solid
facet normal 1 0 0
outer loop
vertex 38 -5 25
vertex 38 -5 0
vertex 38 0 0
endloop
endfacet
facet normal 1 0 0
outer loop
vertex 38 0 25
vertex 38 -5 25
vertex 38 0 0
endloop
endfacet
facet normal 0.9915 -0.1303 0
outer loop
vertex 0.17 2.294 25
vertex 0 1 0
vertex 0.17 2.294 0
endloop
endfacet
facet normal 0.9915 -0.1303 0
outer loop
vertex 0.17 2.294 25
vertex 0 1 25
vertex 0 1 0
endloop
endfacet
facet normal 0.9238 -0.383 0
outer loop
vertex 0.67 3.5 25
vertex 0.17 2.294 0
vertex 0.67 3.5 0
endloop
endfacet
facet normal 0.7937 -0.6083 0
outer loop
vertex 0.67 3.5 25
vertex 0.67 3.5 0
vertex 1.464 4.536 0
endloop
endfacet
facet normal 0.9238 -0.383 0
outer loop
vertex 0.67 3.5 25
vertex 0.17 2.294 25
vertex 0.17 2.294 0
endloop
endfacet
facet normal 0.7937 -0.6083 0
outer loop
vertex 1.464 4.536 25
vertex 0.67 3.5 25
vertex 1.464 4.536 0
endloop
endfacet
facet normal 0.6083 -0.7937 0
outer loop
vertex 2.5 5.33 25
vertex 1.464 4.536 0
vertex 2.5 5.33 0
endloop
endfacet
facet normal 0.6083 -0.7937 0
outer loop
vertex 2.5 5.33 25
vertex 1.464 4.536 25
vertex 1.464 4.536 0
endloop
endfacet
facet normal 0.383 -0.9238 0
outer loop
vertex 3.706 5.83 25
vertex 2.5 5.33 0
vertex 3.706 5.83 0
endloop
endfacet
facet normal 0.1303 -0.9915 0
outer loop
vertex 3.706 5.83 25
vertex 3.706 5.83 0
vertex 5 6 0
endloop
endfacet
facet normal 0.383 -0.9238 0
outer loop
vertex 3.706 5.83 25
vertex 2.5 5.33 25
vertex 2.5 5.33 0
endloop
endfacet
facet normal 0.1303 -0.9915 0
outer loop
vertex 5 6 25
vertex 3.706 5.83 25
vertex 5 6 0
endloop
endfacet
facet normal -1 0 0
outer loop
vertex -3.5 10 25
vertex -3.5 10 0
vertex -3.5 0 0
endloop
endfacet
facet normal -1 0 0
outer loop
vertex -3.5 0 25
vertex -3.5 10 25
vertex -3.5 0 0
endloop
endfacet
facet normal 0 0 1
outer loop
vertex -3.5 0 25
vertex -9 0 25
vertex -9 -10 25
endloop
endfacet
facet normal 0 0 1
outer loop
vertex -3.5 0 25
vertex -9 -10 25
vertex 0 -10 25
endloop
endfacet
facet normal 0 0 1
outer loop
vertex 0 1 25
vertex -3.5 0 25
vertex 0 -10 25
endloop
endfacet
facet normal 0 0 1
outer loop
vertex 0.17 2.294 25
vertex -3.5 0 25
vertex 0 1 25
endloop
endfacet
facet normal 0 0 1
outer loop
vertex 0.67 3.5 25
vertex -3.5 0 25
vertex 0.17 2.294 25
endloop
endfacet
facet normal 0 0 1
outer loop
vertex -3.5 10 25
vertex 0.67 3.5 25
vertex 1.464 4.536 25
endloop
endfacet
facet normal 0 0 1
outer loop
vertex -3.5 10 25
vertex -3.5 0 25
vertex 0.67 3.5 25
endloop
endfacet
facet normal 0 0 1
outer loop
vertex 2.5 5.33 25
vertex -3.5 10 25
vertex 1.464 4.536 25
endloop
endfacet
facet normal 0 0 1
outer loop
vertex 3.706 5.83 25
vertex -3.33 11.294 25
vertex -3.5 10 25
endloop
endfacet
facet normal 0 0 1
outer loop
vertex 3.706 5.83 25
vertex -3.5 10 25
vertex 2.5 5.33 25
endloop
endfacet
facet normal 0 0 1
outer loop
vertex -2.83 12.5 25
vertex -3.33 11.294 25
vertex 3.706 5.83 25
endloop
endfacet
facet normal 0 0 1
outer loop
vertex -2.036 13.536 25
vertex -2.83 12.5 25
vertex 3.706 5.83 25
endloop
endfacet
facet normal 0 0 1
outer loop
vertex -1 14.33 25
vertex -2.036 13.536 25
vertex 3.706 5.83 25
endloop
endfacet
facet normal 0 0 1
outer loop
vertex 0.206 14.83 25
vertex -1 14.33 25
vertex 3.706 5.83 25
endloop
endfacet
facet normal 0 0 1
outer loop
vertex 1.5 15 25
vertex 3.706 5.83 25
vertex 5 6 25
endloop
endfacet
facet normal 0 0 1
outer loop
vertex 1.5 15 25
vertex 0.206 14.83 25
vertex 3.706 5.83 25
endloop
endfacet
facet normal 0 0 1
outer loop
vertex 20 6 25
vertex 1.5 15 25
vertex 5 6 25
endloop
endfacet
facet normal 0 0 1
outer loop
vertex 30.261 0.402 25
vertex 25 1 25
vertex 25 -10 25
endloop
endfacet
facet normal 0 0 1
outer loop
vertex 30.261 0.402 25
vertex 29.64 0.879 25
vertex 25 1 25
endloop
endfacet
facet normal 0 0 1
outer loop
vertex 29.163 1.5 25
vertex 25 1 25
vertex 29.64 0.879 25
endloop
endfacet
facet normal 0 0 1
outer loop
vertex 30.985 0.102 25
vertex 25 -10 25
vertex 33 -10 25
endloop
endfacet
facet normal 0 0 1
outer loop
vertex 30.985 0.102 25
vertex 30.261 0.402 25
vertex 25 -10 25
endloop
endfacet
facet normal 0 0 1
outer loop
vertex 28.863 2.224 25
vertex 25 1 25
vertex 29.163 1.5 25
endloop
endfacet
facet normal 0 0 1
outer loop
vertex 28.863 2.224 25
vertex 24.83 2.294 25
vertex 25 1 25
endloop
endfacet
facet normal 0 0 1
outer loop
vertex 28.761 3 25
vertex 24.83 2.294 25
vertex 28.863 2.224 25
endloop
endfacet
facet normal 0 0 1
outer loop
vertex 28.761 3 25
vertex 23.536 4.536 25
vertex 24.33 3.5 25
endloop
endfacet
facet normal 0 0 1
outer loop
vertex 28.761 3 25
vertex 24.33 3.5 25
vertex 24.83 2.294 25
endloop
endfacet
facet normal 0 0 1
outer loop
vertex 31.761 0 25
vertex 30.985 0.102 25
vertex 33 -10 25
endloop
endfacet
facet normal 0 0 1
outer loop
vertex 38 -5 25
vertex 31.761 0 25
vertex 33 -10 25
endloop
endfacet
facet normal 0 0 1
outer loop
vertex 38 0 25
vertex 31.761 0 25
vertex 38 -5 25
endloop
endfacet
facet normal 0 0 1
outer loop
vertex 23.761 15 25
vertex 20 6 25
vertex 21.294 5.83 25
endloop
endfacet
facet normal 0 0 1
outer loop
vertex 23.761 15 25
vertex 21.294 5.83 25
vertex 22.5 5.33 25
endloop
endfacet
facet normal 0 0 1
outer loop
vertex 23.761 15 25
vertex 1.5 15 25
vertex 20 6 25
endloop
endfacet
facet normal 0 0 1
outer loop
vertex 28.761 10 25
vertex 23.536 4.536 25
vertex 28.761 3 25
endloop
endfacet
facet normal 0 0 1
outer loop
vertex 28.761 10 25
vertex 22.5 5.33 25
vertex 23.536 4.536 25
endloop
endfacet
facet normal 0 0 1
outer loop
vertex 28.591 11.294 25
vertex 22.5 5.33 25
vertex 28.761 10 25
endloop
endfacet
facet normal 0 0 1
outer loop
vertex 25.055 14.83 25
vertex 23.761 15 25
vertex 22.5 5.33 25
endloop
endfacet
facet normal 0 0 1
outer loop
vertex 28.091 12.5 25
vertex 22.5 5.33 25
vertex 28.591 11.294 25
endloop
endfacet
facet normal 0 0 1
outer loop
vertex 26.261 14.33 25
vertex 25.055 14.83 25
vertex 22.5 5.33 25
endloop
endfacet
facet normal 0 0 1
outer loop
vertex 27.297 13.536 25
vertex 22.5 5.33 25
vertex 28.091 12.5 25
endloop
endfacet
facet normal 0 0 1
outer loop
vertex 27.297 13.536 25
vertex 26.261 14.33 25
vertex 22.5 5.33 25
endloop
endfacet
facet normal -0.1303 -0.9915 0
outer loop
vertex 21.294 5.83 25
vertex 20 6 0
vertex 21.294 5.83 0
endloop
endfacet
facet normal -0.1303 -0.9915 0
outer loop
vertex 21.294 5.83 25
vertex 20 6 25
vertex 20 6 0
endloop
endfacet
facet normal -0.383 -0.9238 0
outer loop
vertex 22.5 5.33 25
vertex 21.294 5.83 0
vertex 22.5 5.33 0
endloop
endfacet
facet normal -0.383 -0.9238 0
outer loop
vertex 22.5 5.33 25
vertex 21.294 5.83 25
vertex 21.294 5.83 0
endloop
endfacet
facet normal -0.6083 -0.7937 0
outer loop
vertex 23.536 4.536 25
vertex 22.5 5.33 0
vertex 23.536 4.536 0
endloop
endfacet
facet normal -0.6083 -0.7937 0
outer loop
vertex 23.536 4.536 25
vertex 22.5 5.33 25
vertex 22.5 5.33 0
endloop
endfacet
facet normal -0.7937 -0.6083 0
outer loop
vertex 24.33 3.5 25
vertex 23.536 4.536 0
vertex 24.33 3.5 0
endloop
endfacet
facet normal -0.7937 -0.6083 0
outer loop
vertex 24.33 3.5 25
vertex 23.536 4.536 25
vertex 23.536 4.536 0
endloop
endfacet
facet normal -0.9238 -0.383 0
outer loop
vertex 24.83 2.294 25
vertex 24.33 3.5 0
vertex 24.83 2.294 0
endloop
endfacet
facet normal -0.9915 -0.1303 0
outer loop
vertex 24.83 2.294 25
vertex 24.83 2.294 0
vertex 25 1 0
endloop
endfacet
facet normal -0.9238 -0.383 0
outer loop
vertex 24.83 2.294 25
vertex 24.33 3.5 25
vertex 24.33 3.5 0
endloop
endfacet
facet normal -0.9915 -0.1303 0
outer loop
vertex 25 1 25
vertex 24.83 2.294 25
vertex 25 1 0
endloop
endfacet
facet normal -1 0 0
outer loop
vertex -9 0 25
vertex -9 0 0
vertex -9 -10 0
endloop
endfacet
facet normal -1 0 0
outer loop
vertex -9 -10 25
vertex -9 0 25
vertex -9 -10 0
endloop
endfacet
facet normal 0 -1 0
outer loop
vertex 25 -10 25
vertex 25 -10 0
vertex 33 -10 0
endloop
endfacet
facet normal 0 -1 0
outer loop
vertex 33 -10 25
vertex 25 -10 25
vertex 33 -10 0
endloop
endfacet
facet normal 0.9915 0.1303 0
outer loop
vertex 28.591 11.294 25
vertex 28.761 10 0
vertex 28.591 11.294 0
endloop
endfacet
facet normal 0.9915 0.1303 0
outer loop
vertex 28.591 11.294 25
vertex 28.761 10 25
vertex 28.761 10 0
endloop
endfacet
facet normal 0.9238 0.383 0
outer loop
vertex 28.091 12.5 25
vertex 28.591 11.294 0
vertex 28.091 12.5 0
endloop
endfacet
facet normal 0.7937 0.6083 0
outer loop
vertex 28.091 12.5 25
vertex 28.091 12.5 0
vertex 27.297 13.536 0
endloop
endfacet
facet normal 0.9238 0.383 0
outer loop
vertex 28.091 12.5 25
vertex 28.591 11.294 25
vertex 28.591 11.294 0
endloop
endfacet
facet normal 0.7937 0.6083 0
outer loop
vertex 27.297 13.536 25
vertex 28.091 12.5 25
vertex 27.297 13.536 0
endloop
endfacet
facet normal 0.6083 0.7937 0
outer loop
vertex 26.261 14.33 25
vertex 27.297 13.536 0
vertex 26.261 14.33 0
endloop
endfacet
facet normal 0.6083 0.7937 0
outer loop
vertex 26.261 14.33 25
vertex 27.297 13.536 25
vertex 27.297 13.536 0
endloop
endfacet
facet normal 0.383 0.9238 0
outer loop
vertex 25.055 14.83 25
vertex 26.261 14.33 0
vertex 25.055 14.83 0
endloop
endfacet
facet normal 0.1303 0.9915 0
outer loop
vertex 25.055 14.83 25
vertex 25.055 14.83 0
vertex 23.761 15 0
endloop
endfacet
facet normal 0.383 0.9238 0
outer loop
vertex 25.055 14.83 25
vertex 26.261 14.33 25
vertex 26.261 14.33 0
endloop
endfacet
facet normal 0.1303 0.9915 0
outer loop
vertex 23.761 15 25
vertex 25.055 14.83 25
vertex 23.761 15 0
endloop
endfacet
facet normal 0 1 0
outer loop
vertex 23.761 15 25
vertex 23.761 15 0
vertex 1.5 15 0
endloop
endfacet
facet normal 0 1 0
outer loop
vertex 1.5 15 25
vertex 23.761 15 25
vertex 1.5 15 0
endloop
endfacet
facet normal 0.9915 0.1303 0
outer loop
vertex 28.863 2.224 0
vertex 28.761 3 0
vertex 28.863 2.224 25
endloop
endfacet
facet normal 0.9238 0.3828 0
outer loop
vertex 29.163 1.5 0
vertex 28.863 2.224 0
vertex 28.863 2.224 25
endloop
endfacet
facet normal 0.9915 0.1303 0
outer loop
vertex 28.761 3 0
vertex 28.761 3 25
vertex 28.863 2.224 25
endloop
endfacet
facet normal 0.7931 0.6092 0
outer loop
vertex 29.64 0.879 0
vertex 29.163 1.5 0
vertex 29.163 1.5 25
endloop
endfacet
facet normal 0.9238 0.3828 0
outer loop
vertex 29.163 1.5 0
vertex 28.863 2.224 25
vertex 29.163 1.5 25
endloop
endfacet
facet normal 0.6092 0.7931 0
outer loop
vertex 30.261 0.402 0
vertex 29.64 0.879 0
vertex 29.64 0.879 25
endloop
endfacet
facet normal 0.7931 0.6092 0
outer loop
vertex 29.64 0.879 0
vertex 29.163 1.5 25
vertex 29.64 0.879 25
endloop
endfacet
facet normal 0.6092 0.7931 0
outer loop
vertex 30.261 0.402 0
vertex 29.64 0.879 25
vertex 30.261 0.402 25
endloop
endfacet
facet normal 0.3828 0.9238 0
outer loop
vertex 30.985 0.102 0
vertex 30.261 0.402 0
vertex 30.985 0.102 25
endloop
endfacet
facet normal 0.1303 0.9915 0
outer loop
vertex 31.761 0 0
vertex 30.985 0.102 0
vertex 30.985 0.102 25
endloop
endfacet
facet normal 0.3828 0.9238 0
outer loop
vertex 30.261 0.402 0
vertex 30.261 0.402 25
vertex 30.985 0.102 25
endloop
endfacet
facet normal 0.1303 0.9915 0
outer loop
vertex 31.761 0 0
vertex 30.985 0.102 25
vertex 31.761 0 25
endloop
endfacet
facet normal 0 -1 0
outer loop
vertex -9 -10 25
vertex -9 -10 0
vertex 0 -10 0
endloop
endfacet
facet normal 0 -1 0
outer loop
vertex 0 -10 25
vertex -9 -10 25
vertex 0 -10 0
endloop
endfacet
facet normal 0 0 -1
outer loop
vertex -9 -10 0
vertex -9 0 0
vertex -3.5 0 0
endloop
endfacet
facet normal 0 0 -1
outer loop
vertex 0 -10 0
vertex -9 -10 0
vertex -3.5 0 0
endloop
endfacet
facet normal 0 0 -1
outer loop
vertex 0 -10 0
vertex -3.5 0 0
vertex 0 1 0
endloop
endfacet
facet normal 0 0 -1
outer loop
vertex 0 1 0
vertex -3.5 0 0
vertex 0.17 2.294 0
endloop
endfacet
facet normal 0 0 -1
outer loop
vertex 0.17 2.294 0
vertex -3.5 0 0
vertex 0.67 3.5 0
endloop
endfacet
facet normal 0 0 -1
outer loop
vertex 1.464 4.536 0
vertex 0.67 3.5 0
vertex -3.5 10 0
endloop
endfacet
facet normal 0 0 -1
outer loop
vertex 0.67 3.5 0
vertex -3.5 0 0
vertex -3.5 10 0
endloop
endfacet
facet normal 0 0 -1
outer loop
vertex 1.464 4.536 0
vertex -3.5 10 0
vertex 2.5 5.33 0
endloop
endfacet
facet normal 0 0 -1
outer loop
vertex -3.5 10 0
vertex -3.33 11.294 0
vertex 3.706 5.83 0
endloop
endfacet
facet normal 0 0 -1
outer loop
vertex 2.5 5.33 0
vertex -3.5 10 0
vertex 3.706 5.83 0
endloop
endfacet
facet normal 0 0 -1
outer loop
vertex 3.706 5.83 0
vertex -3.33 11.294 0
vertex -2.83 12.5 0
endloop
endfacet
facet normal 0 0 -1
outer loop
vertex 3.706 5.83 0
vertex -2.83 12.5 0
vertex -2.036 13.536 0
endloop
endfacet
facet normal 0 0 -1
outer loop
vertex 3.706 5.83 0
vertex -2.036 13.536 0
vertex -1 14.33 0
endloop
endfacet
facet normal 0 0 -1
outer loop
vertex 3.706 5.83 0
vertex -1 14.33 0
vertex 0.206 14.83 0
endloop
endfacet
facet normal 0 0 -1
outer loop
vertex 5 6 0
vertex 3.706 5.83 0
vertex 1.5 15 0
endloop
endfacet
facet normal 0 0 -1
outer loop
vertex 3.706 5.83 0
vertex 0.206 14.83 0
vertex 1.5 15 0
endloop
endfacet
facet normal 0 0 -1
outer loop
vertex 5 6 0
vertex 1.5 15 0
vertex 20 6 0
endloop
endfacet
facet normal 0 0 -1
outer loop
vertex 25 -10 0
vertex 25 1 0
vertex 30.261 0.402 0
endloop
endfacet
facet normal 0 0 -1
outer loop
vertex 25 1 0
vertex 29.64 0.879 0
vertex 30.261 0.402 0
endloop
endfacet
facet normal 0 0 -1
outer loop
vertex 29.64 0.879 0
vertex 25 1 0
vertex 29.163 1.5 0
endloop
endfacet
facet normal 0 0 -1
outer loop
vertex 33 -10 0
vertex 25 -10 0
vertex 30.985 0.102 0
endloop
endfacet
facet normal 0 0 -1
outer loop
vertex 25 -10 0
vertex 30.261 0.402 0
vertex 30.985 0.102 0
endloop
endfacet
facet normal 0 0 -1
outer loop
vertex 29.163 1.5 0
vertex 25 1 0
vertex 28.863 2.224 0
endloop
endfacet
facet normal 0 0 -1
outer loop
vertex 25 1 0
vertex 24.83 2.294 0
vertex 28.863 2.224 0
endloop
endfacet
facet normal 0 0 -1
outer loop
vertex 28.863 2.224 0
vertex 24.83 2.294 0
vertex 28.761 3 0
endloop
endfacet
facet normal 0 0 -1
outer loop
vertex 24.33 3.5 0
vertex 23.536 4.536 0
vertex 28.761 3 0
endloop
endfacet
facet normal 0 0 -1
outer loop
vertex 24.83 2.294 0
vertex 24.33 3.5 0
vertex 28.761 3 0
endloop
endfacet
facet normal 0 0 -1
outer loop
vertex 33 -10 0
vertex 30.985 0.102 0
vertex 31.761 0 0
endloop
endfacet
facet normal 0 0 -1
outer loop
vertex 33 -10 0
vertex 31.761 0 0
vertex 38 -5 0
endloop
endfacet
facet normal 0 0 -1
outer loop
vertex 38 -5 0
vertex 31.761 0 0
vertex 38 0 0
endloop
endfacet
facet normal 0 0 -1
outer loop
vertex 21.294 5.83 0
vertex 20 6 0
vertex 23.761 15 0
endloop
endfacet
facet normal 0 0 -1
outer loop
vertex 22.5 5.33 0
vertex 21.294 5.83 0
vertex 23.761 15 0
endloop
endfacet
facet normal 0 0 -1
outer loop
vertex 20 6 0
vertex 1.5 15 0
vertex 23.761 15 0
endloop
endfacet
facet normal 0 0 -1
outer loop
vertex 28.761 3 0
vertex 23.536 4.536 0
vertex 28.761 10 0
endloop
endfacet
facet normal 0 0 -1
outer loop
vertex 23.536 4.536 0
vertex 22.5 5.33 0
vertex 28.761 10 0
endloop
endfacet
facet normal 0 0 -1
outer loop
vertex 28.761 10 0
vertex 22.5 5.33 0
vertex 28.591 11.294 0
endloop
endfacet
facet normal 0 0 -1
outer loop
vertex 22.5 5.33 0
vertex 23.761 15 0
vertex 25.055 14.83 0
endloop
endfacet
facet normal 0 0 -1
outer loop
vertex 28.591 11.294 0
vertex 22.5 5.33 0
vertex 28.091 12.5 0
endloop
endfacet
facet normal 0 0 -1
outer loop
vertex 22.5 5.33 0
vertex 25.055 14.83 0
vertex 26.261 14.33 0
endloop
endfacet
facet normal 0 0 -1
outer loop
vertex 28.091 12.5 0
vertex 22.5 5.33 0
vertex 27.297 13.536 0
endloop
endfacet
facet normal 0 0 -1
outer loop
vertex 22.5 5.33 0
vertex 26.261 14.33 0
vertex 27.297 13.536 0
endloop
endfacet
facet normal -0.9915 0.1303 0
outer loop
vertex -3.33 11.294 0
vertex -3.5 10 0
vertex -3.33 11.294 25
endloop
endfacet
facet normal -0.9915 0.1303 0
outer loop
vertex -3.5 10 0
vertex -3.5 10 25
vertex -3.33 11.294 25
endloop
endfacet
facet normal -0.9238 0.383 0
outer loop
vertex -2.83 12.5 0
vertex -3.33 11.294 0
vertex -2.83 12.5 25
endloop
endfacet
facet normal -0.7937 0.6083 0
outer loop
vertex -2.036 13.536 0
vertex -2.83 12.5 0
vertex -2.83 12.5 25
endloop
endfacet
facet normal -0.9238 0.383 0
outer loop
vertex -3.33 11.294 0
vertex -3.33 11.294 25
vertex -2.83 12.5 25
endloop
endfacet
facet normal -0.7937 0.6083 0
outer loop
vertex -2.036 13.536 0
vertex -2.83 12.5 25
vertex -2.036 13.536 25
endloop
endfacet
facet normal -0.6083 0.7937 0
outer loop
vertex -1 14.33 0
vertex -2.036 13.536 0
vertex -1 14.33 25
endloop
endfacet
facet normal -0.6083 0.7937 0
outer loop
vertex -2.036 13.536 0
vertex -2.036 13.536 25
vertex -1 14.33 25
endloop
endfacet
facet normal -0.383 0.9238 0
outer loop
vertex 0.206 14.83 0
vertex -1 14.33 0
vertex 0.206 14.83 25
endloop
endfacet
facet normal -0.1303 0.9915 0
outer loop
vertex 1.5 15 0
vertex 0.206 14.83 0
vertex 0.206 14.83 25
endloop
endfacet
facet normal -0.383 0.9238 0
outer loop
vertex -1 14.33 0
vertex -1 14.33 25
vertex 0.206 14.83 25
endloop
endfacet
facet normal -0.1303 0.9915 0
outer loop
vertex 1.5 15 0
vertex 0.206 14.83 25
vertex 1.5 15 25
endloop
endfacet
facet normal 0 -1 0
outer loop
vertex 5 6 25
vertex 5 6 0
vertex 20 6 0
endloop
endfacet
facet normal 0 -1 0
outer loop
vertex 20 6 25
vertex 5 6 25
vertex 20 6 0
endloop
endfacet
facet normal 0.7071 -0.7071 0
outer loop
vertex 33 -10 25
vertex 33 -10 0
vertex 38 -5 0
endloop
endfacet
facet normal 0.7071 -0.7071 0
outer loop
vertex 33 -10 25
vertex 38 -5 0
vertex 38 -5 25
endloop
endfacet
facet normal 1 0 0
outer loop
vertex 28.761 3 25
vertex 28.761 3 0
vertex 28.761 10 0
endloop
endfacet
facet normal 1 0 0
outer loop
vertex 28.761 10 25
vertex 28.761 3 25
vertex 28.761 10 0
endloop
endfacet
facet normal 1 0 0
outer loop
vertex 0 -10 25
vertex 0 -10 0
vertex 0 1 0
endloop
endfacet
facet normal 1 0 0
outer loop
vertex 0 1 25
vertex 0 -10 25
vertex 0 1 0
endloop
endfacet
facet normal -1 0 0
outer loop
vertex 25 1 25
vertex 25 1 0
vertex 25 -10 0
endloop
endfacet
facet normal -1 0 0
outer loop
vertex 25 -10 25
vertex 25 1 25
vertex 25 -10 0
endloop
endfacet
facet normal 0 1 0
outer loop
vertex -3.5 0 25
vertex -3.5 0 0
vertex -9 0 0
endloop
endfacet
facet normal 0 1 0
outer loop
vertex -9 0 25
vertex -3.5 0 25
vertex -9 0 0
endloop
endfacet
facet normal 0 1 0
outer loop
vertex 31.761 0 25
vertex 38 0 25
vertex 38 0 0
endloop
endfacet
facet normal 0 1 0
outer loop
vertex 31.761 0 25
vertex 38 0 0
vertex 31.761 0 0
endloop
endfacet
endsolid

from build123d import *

# Parameters (mm, degrees)
F1_DEPTH = 25
F2_R     = 5
F3_R     = 3
F4_SIZE  = 5


with BuildPart() as f1:
    # F0 (on Top) → F1 (new body)
    with BuildSketch(Plane.XY):
        Polygon((0, 15), (-3.5, 15), (-3.5, 0), (-9, 0), (-9, -10), (0, -10), (0, 0), (0, 6), (25, 6), (25, 0), (25, -10), (38, -10), (38, 0), (28.7611037493, 0), (28.7611037493, 15), (25, 15), align=None)
    extrude(amount=F1_DEPTH)

    # F2
    f2_edges = [f1.edges().sort_by_distance(p)[0] for p in [
        (-3.5, 15, 12.5),
        (28.761104, 15, 12.5),
        (0, 6, 12.5),
        (25, 6, 12.5),
    ]]
    fillet(f2_edges, radius=F2_R)

    # F3
    f3_edges = [f1.edges().sort_by_distance(p)[0] for p in [
        (28.761104, 0, 12.5),
    ]]
    fillet(f3_edges, radius=F3_R)

    # F4
    f4_edges = [f1.edges().sort_by_distance(p)[0] for p in [
        (38, -10, 12.5),
    ]]
    chamfer(f4_edges, length=F4_SIZE)


solid = f1.part
